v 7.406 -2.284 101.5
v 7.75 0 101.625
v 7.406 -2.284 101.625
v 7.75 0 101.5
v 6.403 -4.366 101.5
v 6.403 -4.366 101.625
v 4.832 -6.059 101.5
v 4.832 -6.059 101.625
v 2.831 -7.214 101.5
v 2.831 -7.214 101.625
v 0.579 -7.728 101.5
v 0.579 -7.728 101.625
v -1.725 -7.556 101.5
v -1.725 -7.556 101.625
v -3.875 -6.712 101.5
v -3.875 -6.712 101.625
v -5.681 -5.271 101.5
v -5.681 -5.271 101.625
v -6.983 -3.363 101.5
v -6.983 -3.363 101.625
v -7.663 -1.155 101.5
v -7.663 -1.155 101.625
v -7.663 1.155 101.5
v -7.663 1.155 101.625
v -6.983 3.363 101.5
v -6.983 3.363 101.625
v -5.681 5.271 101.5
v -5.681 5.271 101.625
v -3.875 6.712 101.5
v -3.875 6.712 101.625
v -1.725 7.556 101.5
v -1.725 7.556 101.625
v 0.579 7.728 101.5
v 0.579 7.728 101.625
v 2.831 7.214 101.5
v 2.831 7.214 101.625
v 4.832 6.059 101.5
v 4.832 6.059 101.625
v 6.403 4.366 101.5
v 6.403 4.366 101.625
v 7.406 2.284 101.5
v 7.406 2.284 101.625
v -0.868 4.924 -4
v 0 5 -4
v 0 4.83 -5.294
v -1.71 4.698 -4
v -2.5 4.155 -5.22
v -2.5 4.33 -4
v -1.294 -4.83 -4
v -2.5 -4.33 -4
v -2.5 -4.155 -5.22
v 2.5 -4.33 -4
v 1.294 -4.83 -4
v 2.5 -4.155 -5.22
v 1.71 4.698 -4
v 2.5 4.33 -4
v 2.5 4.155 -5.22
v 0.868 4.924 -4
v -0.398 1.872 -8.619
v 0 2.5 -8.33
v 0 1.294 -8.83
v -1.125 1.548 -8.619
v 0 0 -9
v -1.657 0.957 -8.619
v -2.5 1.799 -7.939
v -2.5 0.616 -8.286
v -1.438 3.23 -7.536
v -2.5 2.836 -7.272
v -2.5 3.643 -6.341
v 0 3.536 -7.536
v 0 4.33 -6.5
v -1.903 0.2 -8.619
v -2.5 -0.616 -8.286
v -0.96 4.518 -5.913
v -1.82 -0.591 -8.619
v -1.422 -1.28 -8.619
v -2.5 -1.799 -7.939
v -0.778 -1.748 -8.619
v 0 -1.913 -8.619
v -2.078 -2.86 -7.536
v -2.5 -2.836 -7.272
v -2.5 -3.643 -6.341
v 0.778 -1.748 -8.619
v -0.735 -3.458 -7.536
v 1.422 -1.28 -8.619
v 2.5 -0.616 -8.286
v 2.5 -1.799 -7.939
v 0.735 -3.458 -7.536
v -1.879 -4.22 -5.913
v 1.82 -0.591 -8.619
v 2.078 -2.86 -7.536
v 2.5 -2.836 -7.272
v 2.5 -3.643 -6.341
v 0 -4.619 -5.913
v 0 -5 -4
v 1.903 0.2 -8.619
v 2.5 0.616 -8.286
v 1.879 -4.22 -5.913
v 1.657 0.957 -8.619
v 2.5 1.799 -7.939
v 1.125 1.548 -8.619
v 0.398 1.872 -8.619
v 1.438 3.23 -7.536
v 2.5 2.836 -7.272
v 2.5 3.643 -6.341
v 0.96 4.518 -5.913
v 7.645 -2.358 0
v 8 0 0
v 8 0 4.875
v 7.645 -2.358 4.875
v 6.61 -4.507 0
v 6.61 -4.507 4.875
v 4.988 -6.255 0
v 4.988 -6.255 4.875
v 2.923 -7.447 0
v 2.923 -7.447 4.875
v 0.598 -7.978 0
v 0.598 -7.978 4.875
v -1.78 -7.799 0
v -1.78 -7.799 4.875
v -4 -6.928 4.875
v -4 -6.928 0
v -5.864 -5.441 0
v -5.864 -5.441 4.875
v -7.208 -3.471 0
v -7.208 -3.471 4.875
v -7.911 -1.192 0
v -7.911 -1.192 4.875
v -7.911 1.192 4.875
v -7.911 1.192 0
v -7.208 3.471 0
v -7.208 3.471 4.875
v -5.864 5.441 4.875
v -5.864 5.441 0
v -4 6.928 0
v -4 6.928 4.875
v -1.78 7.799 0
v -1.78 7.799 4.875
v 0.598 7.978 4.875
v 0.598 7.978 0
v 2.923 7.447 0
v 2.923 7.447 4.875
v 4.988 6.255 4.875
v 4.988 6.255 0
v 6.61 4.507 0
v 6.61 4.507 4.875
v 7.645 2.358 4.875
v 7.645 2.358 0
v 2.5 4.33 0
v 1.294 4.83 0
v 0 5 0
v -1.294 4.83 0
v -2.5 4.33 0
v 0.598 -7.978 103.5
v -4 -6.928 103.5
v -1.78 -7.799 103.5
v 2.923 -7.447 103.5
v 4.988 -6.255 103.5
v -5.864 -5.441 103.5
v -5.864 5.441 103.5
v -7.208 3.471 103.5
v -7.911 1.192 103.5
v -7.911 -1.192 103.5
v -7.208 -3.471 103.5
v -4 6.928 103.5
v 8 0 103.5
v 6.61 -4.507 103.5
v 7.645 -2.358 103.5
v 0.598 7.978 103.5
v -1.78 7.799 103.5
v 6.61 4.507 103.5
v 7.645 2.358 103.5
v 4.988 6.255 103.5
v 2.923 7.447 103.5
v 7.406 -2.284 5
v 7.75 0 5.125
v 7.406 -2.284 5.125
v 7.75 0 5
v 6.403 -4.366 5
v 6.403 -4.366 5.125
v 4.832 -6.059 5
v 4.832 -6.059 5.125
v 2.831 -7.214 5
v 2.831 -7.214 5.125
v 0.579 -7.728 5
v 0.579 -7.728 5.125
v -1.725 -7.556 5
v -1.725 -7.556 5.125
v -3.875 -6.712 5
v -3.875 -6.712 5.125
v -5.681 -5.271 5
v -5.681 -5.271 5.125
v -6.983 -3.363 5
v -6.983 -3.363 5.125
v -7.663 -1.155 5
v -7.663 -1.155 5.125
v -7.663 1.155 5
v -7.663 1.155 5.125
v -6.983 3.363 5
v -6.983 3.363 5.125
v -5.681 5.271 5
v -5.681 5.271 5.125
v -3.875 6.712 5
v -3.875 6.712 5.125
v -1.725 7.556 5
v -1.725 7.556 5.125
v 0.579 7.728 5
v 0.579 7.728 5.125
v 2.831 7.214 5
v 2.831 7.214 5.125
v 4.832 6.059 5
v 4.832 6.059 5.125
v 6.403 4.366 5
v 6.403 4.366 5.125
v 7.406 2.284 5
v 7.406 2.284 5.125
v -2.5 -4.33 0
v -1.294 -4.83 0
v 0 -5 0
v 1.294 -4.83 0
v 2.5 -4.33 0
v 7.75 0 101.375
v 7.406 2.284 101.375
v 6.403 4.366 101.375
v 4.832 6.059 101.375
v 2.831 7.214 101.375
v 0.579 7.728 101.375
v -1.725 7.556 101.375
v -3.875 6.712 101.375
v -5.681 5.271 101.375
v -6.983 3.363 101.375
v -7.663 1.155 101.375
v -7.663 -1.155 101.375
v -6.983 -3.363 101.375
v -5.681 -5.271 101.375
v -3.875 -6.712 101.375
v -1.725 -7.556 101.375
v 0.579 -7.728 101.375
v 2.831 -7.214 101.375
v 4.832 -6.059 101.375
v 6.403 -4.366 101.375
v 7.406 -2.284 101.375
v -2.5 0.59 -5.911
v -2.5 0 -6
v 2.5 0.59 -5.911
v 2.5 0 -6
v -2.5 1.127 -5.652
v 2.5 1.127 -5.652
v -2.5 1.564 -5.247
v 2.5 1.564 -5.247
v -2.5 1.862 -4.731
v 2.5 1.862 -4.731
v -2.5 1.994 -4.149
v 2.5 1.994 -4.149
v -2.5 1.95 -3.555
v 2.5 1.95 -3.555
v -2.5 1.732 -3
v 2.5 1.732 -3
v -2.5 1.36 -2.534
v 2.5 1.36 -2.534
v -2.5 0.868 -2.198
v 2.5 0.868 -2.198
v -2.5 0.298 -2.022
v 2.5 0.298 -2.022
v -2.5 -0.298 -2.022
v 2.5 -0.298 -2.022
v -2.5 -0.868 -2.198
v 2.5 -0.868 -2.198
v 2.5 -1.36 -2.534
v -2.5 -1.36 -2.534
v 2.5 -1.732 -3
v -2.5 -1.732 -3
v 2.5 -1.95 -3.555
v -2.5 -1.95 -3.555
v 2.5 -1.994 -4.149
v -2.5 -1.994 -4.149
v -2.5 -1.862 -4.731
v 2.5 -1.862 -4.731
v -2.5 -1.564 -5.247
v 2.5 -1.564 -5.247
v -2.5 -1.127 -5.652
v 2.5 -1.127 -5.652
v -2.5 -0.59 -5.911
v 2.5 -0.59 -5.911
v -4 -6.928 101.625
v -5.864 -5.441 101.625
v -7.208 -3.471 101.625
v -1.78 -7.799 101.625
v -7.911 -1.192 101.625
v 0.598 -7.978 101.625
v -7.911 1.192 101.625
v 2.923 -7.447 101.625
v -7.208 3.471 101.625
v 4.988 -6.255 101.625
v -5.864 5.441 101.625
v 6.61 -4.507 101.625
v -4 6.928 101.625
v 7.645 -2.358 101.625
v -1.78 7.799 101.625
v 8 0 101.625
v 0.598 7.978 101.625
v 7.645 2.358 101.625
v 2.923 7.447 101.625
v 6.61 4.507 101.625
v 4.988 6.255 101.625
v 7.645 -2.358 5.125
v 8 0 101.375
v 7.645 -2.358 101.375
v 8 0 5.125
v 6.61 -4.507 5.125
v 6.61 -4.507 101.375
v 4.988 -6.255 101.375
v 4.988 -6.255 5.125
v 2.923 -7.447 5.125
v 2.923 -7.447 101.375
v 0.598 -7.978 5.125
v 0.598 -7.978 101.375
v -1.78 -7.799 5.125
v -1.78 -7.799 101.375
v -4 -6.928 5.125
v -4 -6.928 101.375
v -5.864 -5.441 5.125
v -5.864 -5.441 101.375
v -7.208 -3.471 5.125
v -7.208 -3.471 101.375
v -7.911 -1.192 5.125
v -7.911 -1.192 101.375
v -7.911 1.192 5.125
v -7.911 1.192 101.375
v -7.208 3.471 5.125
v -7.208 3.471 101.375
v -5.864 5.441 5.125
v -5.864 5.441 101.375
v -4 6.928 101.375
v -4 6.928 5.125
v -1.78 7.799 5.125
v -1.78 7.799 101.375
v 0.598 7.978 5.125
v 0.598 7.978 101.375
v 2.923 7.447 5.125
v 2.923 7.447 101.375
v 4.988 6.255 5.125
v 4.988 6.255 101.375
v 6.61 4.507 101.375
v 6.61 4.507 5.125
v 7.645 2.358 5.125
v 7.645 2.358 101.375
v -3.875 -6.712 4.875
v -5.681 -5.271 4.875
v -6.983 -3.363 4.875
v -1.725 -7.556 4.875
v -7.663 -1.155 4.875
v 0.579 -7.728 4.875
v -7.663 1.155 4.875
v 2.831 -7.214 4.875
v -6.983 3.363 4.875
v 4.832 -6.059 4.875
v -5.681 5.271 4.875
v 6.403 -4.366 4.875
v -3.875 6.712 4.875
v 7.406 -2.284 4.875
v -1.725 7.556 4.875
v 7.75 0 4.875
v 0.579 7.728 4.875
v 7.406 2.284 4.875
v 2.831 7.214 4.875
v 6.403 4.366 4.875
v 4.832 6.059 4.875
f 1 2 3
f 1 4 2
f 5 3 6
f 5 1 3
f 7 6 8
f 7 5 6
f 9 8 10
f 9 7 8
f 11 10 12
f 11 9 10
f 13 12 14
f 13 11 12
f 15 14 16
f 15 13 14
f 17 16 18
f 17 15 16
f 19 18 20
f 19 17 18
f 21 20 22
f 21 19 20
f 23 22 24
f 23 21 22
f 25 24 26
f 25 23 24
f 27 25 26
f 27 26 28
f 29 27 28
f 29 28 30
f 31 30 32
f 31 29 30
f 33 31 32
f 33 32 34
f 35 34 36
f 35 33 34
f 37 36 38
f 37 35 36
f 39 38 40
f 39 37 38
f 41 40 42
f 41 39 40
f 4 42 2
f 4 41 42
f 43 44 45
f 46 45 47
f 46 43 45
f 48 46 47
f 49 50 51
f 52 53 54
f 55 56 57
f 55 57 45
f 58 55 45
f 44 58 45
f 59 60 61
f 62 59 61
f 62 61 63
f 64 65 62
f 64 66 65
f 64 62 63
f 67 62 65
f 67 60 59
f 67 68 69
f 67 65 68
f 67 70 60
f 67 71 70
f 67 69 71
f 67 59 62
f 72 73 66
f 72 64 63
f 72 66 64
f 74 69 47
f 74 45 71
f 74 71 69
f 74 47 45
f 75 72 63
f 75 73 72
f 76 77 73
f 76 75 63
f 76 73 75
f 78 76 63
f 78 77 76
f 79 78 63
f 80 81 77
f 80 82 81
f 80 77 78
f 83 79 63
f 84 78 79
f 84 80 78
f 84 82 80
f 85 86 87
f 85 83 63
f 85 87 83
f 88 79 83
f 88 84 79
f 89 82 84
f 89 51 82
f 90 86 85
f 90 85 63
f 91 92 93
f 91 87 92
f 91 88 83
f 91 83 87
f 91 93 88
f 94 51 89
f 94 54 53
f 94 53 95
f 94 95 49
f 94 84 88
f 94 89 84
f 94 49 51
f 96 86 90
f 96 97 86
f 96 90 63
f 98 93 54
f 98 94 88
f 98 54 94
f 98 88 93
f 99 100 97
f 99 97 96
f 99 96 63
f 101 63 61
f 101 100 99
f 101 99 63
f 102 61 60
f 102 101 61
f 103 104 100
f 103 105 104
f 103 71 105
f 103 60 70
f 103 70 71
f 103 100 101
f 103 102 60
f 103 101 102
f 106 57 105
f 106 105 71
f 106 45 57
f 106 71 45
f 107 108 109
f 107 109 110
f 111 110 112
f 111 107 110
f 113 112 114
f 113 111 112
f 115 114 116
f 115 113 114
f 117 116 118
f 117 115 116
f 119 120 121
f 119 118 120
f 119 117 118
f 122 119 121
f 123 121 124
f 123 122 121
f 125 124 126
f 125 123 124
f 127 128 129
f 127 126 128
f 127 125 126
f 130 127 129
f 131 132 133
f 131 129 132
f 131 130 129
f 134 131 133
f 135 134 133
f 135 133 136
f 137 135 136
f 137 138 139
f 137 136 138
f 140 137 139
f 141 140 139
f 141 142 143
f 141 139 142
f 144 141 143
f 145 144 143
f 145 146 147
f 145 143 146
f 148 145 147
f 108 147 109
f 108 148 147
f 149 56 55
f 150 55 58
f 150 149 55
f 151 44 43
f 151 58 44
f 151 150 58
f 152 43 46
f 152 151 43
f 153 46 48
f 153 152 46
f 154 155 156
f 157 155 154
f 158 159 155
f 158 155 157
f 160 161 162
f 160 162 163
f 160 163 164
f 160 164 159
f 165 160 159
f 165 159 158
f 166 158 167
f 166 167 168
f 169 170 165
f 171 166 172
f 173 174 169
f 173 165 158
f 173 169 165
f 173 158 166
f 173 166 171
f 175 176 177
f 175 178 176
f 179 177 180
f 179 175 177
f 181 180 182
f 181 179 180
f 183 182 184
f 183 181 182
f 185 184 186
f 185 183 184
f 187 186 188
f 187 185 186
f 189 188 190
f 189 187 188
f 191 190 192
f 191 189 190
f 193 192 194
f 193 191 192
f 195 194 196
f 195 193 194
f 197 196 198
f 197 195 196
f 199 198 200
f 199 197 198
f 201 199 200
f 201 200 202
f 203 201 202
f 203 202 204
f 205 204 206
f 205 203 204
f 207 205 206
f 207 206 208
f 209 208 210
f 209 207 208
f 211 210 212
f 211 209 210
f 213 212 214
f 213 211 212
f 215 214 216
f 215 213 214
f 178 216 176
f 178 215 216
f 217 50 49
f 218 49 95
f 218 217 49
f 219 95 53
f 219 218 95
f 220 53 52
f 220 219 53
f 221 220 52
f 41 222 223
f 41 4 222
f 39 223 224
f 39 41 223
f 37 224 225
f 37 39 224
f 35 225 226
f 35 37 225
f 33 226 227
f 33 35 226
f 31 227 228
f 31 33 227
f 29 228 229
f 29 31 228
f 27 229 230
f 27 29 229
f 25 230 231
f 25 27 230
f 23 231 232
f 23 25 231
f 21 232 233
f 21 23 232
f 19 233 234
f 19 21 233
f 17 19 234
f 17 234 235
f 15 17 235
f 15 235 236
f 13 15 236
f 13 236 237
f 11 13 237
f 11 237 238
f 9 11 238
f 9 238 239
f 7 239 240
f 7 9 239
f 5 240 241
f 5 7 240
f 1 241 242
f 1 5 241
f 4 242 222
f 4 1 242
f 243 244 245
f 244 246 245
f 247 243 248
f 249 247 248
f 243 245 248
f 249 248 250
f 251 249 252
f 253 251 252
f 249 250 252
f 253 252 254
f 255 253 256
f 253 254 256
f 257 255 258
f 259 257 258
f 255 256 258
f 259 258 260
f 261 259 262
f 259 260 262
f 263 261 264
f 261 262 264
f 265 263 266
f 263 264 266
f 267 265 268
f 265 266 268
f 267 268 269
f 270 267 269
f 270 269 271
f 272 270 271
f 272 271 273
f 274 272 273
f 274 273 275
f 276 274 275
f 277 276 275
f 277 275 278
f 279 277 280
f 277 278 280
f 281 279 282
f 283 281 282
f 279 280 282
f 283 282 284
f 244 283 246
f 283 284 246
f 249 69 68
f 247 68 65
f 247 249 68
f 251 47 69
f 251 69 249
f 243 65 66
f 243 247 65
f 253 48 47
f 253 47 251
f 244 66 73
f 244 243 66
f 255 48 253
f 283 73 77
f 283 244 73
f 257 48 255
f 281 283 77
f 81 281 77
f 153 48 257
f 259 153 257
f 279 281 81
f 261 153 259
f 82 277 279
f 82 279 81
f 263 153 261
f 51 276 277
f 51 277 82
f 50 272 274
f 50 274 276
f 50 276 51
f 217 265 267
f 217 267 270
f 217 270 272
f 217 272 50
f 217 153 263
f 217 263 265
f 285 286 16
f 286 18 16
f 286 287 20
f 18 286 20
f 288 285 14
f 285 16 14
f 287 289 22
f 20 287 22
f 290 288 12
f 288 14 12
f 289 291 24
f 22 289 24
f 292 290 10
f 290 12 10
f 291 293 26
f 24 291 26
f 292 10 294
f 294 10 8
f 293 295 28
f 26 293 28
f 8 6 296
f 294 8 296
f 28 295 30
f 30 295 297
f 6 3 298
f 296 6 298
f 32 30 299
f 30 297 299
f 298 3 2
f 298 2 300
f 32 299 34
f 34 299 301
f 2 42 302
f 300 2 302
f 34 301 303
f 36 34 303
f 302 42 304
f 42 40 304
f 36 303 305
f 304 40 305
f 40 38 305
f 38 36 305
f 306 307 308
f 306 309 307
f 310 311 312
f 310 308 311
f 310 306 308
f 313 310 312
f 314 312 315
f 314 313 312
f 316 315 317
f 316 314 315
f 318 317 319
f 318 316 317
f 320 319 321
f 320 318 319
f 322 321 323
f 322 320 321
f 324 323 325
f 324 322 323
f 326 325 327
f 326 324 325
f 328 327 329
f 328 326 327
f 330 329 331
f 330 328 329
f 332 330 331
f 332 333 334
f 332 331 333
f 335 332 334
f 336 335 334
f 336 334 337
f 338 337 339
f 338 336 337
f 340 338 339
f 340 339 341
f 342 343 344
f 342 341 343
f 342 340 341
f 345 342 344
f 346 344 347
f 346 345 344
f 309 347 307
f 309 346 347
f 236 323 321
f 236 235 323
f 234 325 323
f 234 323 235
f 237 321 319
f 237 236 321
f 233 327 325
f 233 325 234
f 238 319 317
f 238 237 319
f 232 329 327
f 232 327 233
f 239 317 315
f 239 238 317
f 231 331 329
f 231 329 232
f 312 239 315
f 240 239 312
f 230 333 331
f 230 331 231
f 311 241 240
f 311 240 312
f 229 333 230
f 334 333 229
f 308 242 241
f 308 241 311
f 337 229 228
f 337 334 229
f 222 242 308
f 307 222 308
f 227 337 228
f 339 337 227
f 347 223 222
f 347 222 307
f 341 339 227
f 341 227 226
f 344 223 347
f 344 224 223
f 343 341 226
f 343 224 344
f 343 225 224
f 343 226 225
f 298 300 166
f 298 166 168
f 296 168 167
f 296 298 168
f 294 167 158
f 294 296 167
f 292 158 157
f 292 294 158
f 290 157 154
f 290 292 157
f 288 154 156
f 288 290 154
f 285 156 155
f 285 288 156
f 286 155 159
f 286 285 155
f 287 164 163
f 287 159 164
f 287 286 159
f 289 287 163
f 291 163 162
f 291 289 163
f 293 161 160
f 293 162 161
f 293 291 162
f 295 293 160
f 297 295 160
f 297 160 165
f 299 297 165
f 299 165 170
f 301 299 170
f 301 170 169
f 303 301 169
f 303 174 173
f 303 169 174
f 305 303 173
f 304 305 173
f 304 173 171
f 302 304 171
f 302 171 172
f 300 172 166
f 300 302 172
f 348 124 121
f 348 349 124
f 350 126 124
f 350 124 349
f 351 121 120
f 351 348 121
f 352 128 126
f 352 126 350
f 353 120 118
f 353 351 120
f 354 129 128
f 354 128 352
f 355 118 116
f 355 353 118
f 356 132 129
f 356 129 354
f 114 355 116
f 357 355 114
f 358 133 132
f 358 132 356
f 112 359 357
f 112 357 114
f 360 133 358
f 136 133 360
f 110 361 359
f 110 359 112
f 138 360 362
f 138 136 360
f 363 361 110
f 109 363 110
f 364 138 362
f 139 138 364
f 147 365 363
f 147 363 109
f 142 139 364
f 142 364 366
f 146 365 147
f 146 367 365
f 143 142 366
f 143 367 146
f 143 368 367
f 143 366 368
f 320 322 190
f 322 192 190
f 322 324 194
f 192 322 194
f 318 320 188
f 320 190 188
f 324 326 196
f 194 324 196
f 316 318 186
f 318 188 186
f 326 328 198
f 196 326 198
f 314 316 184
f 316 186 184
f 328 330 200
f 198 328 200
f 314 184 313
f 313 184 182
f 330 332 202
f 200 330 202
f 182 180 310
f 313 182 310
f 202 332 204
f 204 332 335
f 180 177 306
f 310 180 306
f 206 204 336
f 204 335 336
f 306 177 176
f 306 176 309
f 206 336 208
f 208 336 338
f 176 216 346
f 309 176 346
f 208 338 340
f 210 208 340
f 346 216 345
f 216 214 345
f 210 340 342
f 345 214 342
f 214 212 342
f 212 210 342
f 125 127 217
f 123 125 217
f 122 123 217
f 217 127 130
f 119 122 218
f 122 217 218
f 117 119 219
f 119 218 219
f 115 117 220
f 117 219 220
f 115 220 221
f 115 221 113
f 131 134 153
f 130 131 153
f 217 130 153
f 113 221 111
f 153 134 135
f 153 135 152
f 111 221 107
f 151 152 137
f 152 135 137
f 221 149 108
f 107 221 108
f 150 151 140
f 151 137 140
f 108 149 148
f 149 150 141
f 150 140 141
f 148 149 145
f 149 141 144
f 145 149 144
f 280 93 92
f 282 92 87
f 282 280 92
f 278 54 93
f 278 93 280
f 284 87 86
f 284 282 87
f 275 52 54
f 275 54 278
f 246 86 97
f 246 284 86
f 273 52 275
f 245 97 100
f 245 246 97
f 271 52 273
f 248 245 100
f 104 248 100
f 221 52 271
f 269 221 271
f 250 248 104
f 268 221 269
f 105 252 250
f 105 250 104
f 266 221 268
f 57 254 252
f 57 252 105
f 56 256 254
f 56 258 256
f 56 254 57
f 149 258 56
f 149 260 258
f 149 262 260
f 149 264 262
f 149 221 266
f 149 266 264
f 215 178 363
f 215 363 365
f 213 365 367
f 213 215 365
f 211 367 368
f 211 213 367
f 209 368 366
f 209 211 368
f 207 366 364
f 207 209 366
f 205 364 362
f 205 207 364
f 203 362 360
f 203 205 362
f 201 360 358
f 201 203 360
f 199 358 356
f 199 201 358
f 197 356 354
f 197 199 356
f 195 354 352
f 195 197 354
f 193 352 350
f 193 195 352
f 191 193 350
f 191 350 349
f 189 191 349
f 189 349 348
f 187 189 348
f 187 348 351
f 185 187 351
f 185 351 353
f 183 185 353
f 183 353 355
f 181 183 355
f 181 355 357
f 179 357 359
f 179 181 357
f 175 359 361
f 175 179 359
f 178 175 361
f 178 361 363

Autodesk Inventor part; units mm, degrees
ref_plane "YZ Plane" through (0, 0, 0) normal (1, 0, 0) x (0, 1, 0)
sketch "Base" plane through (0, 0, 0) normal (0, 0, 1) x (1, 0, 0)
  circle A0 centre (0, 0) radius 8
  dimension "d0" = 16
extrude "BaseFeature" add sketch "Base" along normal blind 5
sketch "Mount" plane through (0, 0, 0) normal (0, 0, -1) x (-1, 0, 0)
  line L0 (2.5, -5) -> (-2.5, -5)
  line L1 (-2.5, -5) -> (-2.5, 5)
  line L2 (-2.5, 5) -> (2.5, 5)
  line L3 (2.5, 5) -> (2.5, -5)
  line L4 (11.2, 0) -> (-11.2, 0) construction
  line L5 (0, -11.2) -> (0, 11.2) construction
  circle A0 centre (0, 0) radius 5
  point P0 (0, -5)
  point P1 (2.5, 4.3301)
  point P2 (-2.5, 4.3301)
  point P3 (-2.5, -4.3301)
  point P4 (2.5, -4.3301)
  dimension "d3" = 10
  dimension "d4" = 5
extrude "MountFeature" add sketch "Mount" along normal blind 9 contours A0 L1 L3
sketch "MountProfile" plane through (0, 0, 0) normal (1, 0, 0) x (0, 1, 0)
  line L0 (5, 0) -> (5, -9) projected
  line L1 (4.3301, -9) -> (5, -9) projected
  line L2 (4.3301, -9) -> (-4.3301, -9) projected
  line L3 (-5, -9) -> (-4.3301, -9) projected
  line L4 (-5, 0) -> (-5, -9) projected
  line L5 (8, 0) -> (-8, 0) projected
  circle A0 centre (0, -4) radius 5
  line L6 (5, -4) -> (-5, -4)
  line L7 (0, -11) -> (0, 3) projected
  point P0 (0, 0)
  point P1 (0, -4)
  point P2 (0, -9)
  point P3 (-5, -4)
  point P4 (5, -4)
revolve "MountProfileFeature" cut sketch "MountProfile" angle 360 about axis through (0, 0, -10) along (0, 0, 1) contours L0 L1 L2 A0 | L2 L3 L4 A0
sketch "MountHole" plane through (2.5, -4.3301, 0) normal (1, 0, 0) x (0, 0, -1)
  arc A0 (4, 0) -> (4, 8.6603) centre (4, 4.3301) ccw projected
  circle A1 centre (4, 4.3301) radius 2
  point P0 (0, 4.3301)
  dimension "d15" = 4
extrude "MountHoleFeature" cut sketch "MountHole" against normal blind 10
sketch "Body" plane through (0, 0, 5) normal (0, 0, 1) x (1, 0, 0)
  circle A0 centre (0, 0) radius 8 projected
extrude "BodyFeature" add sketch "Body" along normal blind 96.5
ref_plane "BodyCapPlane" through (0, 0, 101.5) normal (0, 0, 1) x (1, 0, 0)
ref_plane "BaseBodyPlane" through (0, 0, 5) normal (0, 0, 1) x (1, 0, 0)
sketch "Sketch9" plane through (0, 0, 101.5) normal (0, 0, 1) x (1, 0, 0)
  circle A0 centre (0, 0) radius 8 projected
extrude "BodyCapFeature" add sketch "Sketch9" along normal blind 2
sketch "BodyCapEtch" plane through (0, 0, 101.5) normal (0, 0, 1) x (1, 0, 0)
  circle A0 centre (0, 0) radius 8 projected
  circle A1 centre (0, 0) radius 7.75
  dimension "d24" = 0.25
extrude "BodyCapEtchFeature" cut sketch "BodyCapEtch" along normal mid plane 0.25
sketch "BodyBaseEtch" plane through (0, 0, 5) normal (0, 0, 1) x (1, 0, 0)
  circle A0 centre (0, 0) radius 8 projected
  circle A1 centre (0, 0) radius 7.75
  dimension "d27" = 0.25
extrude "BodyBaseEtchFeature" cut sketch "BodyBaseEtch" along normal mid plane 0.25
properties part number "1610-50H-2KG-12V-B07-Body"
